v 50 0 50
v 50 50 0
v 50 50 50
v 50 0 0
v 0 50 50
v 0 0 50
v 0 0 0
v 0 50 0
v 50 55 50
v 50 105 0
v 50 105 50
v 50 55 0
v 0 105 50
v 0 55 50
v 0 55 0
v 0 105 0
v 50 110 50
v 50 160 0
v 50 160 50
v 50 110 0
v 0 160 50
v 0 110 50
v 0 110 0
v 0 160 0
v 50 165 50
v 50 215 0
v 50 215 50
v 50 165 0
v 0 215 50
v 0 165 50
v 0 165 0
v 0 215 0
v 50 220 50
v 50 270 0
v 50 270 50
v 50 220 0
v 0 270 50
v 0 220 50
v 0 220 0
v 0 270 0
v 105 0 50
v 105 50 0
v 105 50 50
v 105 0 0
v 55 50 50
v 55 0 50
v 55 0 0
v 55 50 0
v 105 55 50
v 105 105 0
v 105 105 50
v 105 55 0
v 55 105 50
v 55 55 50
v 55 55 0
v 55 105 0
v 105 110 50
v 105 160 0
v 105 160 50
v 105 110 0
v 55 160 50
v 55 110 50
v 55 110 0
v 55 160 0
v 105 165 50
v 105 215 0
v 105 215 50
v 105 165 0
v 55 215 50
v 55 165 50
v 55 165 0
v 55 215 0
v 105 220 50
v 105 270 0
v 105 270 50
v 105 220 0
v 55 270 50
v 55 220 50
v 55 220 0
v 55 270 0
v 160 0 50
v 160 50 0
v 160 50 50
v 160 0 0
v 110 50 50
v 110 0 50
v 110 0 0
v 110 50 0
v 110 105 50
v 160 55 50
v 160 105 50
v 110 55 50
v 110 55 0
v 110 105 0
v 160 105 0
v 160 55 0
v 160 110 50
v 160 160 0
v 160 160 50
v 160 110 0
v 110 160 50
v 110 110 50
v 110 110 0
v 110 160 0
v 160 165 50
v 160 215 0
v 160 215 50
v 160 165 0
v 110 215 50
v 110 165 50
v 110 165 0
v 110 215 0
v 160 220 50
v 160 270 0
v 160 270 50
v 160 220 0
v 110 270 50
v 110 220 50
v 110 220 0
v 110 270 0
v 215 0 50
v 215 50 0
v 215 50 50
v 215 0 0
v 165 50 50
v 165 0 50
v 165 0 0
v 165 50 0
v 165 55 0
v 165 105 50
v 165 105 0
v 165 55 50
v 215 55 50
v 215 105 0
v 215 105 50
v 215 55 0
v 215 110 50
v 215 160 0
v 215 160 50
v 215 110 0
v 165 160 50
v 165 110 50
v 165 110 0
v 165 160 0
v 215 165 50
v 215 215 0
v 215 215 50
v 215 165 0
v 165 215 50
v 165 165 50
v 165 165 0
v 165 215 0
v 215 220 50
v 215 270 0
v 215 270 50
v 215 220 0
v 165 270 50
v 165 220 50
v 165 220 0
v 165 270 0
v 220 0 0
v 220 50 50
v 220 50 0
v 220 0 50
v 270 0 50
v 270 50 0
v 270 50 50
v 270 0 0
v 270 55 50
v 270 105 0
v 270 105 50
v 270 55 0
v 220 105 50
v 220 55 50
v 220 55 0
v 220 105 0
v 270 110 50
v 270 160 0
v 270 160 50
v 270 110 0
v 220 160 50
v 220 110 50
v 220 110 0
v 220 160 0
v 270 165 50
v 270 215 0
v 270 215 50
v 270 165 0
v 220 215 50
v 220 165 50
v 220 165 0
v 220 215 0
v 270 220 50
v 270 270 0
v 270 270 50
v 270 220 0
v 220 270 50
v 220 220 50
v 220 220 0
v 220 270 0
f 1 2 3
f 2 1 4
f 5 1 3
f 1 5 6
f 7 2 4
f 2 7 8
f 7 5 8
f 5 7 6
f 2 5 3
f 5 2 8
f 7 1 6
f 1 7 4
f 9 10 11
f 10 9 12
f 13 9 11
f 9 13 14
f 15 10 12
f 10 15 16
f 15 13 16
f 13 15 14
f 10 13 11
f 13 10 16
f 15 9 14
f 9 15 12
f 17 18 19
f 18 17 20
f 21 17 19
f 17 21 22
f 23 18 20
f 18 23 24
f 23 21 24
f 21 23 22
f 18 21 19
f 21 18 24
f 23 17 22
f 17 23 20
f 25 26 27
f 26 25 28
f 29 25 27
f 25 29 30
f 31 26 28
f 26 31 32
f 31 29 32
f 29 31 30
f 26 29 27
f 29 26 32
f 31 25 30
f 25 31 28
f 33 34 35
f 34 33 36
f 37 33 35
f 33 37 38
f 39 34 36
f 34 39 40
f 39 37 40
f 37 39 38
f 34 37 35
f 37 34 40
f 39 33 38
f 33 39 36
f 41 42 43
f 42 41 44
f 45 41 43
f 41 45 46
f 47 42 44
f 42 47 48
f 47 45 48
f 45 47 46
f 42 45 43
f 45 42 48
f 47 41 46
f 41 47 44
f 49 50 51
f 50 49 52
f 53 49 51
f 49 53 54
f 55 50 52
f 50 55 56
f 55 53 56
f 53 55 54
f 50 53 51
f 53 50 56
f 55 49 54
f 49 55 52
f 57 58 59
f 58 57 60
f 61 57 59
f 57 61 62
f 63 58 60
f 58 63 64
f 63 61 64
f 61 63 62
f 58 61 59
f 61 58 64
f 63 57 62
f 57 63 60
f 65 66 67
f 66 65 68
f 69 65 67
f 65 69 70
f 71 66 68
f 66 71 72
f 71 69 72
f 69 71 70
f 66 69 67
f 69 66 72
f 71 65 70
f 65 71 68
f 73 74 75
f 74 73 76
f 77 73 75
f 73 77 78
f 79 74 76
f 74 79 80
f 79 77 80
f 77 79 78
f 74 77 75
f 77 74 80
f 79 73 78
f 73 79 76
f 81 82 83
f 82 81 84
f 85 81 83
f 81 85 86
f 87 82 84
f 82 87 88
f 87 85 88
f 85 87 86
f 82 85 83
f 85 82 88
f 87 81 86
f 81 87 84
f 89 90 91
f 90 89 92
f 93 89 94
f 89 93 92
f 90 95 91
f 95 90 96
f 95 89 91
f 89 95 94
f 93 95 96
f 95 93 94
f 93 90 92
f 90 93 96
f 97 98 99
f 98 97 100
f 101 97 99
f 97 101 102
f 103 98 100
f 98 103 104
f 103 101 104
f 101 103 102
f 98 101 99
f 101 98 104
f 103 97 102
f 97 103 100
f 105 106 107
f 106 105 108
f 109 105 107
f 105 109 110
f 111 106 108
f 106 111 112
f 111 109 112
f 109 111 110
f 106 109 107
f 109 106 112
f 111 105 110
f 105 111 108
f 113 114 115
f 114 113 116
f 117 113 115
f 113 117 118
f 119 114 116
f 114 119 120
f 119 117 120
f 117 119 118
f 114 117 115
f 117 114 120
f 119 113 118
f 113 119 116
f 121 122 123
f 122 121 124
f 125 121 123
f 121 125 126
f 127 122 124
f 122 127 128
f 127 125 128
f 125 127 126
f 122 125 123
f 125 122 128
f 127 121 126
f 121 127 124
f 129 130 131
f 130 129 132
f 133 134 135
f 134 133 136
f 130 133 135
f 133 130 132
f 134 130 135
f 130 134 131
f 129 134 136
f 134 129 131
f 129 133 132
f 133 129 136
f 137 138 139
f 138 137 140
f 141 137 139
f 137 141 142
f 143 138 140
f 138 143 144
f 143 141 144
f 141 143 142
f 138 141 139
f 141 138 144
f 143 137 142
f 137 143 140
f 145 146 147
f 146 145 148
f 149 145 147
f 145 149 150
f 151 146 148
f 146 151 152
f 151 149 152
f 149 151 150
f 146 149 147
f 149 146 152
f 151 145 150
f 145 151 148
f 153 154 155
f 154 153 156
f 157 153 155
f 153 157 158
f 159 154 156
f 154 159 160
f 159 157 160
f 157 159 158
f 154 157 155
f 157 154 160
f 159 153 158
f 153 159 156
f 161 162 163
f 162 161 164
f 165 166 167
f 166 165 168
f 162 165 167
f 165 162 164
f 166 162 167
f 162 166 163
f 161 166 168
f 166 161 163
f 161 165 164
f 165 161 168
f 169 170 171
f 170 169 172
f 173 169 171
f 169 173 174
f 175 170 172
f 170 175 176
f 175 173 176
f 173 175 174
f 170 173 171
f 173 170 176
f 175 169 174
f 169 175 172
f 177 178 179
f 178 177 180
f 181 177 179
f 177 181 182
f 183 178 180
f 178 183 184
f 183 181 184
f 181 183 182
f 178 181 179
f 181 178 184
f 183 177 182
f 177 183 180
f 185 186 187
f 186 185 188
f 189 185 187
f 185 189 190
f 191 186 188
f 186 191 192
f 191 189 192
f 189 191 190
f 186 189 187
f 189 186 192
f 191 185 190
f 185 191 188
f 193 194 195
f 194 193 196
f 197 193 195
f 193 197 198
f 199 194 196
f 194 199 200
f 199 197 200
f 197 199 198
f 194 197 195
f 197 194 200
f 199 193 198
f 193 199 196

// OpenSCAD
characterImages = [["B013_ME.png", "B067_KI.png", "B050_PU.png", "B055_NU.png", "B058_SU.png"],
                   ["B013_ME.png", "B050_PU.png", "B016_QA.png", "B058_SU.png", "B055_NU.png"],
                   ["B044_KE.png", "B004_TE.png", "B055_NU.png", "B016_QA.png", "B013_ME.png"],
                   ["B055_NU.png", "B052_NO.png", "B011_PO.png", "B006_NA.png", "B055_NU.png"],
                   ["B053_RI.png", "B058_SU.png", "B009_SE.png", "B024_NE.png", "B044_KE.png"]];

charScale = 0.9; // Edit this to make the character larger or smaller.

imageSize = 50;

spacingBetweenCubes = (imageSize/10);


//container();
//translate([9,9,4])
//translate([(50*5 + 5*4)/2, (50*5 + 5*4)/2, 25])
//rotate([0,180,0])
//translate([-(50*5 + 5*4)/2, -(50*5 + 5*4)/2, -25])
cubes(characterImages, imageSize, charScale, spacingBetweenCubes);




module container()
{
    characterImages = [["B013_ME.png", "B067_KI.png", "B050_PU.png", "B055_NU.png", "B058_SU.png"],
                       ["B013_ME.png", "B050_PU.png", "B016_QA.png", "B058_SU.png", "B055_NU.png"],
                       ["B044_KE.png", "B004_TE.png", "B055_NU.png", "B016_QA.png", "B013_ME.png"],
                       ["B055_NU.png", "B052_NO.png", "B011_PO.png", "B006_NA.png", "B055_NU.png"],
                       ["B053_RI.png", "B058_SU.png", "B009_SE.png", "B024_NE.png", "B044_KE.png"]];
    imageSize = 50;

    spacingBetweenCubes = (imageSize/10);

    containerInnerSize = (imageSize * len(characterImages)) + (spacingBetweenCubes * (1 + len(characterImages)));

    wallThickness = 4;

    outerCubeDimensions = [containerInnerSize + wallThickness*2, containerInnerSize + wallThickness*2, imageSize + wallThickness + 20];
    innerCubeDimensions = [containerInnerSize, containerInnerSize, imageSize + wallThickness + 20];

    difference() {
        cube(outerCubeDimensions);
        translate([wallThickness, wallThickness, wallThickness])
        cube(innerCubeDimensions);
    }
    
}

module cubes (images, imageSize, imageScale, spacingBetweenCubes)
{

    e = 0.1;
    imageImpressionDepth = 1;
    imageImpressionScale = imageImpressionDepth/100; // Calculated from range of surface scaling (0 to 100)
    margin = (imageSize - (imageSize * imageScale))/2;
    centerImageOnCube = [margin, margin, imageImpressionDepth-e];

    for (i = [ 0 : len(characterImages)-1])
    {
        for (j = [ 0 : len(characterImages[i])-1])
        {
            translate([((imageSize*i) + (spacingBetweenCubes*i)),((imageSize*j) + (spacingBetweenCubes*j)),0]) {
                difference() {
                    cube(imageSize);
                    translate(centerImageOnCube)
                        scale([imageScale, imageScale, imageImpressionScale])
                            surface(file = characterImages[i][j], invert = true);
                }
            }
        }
    }
}
